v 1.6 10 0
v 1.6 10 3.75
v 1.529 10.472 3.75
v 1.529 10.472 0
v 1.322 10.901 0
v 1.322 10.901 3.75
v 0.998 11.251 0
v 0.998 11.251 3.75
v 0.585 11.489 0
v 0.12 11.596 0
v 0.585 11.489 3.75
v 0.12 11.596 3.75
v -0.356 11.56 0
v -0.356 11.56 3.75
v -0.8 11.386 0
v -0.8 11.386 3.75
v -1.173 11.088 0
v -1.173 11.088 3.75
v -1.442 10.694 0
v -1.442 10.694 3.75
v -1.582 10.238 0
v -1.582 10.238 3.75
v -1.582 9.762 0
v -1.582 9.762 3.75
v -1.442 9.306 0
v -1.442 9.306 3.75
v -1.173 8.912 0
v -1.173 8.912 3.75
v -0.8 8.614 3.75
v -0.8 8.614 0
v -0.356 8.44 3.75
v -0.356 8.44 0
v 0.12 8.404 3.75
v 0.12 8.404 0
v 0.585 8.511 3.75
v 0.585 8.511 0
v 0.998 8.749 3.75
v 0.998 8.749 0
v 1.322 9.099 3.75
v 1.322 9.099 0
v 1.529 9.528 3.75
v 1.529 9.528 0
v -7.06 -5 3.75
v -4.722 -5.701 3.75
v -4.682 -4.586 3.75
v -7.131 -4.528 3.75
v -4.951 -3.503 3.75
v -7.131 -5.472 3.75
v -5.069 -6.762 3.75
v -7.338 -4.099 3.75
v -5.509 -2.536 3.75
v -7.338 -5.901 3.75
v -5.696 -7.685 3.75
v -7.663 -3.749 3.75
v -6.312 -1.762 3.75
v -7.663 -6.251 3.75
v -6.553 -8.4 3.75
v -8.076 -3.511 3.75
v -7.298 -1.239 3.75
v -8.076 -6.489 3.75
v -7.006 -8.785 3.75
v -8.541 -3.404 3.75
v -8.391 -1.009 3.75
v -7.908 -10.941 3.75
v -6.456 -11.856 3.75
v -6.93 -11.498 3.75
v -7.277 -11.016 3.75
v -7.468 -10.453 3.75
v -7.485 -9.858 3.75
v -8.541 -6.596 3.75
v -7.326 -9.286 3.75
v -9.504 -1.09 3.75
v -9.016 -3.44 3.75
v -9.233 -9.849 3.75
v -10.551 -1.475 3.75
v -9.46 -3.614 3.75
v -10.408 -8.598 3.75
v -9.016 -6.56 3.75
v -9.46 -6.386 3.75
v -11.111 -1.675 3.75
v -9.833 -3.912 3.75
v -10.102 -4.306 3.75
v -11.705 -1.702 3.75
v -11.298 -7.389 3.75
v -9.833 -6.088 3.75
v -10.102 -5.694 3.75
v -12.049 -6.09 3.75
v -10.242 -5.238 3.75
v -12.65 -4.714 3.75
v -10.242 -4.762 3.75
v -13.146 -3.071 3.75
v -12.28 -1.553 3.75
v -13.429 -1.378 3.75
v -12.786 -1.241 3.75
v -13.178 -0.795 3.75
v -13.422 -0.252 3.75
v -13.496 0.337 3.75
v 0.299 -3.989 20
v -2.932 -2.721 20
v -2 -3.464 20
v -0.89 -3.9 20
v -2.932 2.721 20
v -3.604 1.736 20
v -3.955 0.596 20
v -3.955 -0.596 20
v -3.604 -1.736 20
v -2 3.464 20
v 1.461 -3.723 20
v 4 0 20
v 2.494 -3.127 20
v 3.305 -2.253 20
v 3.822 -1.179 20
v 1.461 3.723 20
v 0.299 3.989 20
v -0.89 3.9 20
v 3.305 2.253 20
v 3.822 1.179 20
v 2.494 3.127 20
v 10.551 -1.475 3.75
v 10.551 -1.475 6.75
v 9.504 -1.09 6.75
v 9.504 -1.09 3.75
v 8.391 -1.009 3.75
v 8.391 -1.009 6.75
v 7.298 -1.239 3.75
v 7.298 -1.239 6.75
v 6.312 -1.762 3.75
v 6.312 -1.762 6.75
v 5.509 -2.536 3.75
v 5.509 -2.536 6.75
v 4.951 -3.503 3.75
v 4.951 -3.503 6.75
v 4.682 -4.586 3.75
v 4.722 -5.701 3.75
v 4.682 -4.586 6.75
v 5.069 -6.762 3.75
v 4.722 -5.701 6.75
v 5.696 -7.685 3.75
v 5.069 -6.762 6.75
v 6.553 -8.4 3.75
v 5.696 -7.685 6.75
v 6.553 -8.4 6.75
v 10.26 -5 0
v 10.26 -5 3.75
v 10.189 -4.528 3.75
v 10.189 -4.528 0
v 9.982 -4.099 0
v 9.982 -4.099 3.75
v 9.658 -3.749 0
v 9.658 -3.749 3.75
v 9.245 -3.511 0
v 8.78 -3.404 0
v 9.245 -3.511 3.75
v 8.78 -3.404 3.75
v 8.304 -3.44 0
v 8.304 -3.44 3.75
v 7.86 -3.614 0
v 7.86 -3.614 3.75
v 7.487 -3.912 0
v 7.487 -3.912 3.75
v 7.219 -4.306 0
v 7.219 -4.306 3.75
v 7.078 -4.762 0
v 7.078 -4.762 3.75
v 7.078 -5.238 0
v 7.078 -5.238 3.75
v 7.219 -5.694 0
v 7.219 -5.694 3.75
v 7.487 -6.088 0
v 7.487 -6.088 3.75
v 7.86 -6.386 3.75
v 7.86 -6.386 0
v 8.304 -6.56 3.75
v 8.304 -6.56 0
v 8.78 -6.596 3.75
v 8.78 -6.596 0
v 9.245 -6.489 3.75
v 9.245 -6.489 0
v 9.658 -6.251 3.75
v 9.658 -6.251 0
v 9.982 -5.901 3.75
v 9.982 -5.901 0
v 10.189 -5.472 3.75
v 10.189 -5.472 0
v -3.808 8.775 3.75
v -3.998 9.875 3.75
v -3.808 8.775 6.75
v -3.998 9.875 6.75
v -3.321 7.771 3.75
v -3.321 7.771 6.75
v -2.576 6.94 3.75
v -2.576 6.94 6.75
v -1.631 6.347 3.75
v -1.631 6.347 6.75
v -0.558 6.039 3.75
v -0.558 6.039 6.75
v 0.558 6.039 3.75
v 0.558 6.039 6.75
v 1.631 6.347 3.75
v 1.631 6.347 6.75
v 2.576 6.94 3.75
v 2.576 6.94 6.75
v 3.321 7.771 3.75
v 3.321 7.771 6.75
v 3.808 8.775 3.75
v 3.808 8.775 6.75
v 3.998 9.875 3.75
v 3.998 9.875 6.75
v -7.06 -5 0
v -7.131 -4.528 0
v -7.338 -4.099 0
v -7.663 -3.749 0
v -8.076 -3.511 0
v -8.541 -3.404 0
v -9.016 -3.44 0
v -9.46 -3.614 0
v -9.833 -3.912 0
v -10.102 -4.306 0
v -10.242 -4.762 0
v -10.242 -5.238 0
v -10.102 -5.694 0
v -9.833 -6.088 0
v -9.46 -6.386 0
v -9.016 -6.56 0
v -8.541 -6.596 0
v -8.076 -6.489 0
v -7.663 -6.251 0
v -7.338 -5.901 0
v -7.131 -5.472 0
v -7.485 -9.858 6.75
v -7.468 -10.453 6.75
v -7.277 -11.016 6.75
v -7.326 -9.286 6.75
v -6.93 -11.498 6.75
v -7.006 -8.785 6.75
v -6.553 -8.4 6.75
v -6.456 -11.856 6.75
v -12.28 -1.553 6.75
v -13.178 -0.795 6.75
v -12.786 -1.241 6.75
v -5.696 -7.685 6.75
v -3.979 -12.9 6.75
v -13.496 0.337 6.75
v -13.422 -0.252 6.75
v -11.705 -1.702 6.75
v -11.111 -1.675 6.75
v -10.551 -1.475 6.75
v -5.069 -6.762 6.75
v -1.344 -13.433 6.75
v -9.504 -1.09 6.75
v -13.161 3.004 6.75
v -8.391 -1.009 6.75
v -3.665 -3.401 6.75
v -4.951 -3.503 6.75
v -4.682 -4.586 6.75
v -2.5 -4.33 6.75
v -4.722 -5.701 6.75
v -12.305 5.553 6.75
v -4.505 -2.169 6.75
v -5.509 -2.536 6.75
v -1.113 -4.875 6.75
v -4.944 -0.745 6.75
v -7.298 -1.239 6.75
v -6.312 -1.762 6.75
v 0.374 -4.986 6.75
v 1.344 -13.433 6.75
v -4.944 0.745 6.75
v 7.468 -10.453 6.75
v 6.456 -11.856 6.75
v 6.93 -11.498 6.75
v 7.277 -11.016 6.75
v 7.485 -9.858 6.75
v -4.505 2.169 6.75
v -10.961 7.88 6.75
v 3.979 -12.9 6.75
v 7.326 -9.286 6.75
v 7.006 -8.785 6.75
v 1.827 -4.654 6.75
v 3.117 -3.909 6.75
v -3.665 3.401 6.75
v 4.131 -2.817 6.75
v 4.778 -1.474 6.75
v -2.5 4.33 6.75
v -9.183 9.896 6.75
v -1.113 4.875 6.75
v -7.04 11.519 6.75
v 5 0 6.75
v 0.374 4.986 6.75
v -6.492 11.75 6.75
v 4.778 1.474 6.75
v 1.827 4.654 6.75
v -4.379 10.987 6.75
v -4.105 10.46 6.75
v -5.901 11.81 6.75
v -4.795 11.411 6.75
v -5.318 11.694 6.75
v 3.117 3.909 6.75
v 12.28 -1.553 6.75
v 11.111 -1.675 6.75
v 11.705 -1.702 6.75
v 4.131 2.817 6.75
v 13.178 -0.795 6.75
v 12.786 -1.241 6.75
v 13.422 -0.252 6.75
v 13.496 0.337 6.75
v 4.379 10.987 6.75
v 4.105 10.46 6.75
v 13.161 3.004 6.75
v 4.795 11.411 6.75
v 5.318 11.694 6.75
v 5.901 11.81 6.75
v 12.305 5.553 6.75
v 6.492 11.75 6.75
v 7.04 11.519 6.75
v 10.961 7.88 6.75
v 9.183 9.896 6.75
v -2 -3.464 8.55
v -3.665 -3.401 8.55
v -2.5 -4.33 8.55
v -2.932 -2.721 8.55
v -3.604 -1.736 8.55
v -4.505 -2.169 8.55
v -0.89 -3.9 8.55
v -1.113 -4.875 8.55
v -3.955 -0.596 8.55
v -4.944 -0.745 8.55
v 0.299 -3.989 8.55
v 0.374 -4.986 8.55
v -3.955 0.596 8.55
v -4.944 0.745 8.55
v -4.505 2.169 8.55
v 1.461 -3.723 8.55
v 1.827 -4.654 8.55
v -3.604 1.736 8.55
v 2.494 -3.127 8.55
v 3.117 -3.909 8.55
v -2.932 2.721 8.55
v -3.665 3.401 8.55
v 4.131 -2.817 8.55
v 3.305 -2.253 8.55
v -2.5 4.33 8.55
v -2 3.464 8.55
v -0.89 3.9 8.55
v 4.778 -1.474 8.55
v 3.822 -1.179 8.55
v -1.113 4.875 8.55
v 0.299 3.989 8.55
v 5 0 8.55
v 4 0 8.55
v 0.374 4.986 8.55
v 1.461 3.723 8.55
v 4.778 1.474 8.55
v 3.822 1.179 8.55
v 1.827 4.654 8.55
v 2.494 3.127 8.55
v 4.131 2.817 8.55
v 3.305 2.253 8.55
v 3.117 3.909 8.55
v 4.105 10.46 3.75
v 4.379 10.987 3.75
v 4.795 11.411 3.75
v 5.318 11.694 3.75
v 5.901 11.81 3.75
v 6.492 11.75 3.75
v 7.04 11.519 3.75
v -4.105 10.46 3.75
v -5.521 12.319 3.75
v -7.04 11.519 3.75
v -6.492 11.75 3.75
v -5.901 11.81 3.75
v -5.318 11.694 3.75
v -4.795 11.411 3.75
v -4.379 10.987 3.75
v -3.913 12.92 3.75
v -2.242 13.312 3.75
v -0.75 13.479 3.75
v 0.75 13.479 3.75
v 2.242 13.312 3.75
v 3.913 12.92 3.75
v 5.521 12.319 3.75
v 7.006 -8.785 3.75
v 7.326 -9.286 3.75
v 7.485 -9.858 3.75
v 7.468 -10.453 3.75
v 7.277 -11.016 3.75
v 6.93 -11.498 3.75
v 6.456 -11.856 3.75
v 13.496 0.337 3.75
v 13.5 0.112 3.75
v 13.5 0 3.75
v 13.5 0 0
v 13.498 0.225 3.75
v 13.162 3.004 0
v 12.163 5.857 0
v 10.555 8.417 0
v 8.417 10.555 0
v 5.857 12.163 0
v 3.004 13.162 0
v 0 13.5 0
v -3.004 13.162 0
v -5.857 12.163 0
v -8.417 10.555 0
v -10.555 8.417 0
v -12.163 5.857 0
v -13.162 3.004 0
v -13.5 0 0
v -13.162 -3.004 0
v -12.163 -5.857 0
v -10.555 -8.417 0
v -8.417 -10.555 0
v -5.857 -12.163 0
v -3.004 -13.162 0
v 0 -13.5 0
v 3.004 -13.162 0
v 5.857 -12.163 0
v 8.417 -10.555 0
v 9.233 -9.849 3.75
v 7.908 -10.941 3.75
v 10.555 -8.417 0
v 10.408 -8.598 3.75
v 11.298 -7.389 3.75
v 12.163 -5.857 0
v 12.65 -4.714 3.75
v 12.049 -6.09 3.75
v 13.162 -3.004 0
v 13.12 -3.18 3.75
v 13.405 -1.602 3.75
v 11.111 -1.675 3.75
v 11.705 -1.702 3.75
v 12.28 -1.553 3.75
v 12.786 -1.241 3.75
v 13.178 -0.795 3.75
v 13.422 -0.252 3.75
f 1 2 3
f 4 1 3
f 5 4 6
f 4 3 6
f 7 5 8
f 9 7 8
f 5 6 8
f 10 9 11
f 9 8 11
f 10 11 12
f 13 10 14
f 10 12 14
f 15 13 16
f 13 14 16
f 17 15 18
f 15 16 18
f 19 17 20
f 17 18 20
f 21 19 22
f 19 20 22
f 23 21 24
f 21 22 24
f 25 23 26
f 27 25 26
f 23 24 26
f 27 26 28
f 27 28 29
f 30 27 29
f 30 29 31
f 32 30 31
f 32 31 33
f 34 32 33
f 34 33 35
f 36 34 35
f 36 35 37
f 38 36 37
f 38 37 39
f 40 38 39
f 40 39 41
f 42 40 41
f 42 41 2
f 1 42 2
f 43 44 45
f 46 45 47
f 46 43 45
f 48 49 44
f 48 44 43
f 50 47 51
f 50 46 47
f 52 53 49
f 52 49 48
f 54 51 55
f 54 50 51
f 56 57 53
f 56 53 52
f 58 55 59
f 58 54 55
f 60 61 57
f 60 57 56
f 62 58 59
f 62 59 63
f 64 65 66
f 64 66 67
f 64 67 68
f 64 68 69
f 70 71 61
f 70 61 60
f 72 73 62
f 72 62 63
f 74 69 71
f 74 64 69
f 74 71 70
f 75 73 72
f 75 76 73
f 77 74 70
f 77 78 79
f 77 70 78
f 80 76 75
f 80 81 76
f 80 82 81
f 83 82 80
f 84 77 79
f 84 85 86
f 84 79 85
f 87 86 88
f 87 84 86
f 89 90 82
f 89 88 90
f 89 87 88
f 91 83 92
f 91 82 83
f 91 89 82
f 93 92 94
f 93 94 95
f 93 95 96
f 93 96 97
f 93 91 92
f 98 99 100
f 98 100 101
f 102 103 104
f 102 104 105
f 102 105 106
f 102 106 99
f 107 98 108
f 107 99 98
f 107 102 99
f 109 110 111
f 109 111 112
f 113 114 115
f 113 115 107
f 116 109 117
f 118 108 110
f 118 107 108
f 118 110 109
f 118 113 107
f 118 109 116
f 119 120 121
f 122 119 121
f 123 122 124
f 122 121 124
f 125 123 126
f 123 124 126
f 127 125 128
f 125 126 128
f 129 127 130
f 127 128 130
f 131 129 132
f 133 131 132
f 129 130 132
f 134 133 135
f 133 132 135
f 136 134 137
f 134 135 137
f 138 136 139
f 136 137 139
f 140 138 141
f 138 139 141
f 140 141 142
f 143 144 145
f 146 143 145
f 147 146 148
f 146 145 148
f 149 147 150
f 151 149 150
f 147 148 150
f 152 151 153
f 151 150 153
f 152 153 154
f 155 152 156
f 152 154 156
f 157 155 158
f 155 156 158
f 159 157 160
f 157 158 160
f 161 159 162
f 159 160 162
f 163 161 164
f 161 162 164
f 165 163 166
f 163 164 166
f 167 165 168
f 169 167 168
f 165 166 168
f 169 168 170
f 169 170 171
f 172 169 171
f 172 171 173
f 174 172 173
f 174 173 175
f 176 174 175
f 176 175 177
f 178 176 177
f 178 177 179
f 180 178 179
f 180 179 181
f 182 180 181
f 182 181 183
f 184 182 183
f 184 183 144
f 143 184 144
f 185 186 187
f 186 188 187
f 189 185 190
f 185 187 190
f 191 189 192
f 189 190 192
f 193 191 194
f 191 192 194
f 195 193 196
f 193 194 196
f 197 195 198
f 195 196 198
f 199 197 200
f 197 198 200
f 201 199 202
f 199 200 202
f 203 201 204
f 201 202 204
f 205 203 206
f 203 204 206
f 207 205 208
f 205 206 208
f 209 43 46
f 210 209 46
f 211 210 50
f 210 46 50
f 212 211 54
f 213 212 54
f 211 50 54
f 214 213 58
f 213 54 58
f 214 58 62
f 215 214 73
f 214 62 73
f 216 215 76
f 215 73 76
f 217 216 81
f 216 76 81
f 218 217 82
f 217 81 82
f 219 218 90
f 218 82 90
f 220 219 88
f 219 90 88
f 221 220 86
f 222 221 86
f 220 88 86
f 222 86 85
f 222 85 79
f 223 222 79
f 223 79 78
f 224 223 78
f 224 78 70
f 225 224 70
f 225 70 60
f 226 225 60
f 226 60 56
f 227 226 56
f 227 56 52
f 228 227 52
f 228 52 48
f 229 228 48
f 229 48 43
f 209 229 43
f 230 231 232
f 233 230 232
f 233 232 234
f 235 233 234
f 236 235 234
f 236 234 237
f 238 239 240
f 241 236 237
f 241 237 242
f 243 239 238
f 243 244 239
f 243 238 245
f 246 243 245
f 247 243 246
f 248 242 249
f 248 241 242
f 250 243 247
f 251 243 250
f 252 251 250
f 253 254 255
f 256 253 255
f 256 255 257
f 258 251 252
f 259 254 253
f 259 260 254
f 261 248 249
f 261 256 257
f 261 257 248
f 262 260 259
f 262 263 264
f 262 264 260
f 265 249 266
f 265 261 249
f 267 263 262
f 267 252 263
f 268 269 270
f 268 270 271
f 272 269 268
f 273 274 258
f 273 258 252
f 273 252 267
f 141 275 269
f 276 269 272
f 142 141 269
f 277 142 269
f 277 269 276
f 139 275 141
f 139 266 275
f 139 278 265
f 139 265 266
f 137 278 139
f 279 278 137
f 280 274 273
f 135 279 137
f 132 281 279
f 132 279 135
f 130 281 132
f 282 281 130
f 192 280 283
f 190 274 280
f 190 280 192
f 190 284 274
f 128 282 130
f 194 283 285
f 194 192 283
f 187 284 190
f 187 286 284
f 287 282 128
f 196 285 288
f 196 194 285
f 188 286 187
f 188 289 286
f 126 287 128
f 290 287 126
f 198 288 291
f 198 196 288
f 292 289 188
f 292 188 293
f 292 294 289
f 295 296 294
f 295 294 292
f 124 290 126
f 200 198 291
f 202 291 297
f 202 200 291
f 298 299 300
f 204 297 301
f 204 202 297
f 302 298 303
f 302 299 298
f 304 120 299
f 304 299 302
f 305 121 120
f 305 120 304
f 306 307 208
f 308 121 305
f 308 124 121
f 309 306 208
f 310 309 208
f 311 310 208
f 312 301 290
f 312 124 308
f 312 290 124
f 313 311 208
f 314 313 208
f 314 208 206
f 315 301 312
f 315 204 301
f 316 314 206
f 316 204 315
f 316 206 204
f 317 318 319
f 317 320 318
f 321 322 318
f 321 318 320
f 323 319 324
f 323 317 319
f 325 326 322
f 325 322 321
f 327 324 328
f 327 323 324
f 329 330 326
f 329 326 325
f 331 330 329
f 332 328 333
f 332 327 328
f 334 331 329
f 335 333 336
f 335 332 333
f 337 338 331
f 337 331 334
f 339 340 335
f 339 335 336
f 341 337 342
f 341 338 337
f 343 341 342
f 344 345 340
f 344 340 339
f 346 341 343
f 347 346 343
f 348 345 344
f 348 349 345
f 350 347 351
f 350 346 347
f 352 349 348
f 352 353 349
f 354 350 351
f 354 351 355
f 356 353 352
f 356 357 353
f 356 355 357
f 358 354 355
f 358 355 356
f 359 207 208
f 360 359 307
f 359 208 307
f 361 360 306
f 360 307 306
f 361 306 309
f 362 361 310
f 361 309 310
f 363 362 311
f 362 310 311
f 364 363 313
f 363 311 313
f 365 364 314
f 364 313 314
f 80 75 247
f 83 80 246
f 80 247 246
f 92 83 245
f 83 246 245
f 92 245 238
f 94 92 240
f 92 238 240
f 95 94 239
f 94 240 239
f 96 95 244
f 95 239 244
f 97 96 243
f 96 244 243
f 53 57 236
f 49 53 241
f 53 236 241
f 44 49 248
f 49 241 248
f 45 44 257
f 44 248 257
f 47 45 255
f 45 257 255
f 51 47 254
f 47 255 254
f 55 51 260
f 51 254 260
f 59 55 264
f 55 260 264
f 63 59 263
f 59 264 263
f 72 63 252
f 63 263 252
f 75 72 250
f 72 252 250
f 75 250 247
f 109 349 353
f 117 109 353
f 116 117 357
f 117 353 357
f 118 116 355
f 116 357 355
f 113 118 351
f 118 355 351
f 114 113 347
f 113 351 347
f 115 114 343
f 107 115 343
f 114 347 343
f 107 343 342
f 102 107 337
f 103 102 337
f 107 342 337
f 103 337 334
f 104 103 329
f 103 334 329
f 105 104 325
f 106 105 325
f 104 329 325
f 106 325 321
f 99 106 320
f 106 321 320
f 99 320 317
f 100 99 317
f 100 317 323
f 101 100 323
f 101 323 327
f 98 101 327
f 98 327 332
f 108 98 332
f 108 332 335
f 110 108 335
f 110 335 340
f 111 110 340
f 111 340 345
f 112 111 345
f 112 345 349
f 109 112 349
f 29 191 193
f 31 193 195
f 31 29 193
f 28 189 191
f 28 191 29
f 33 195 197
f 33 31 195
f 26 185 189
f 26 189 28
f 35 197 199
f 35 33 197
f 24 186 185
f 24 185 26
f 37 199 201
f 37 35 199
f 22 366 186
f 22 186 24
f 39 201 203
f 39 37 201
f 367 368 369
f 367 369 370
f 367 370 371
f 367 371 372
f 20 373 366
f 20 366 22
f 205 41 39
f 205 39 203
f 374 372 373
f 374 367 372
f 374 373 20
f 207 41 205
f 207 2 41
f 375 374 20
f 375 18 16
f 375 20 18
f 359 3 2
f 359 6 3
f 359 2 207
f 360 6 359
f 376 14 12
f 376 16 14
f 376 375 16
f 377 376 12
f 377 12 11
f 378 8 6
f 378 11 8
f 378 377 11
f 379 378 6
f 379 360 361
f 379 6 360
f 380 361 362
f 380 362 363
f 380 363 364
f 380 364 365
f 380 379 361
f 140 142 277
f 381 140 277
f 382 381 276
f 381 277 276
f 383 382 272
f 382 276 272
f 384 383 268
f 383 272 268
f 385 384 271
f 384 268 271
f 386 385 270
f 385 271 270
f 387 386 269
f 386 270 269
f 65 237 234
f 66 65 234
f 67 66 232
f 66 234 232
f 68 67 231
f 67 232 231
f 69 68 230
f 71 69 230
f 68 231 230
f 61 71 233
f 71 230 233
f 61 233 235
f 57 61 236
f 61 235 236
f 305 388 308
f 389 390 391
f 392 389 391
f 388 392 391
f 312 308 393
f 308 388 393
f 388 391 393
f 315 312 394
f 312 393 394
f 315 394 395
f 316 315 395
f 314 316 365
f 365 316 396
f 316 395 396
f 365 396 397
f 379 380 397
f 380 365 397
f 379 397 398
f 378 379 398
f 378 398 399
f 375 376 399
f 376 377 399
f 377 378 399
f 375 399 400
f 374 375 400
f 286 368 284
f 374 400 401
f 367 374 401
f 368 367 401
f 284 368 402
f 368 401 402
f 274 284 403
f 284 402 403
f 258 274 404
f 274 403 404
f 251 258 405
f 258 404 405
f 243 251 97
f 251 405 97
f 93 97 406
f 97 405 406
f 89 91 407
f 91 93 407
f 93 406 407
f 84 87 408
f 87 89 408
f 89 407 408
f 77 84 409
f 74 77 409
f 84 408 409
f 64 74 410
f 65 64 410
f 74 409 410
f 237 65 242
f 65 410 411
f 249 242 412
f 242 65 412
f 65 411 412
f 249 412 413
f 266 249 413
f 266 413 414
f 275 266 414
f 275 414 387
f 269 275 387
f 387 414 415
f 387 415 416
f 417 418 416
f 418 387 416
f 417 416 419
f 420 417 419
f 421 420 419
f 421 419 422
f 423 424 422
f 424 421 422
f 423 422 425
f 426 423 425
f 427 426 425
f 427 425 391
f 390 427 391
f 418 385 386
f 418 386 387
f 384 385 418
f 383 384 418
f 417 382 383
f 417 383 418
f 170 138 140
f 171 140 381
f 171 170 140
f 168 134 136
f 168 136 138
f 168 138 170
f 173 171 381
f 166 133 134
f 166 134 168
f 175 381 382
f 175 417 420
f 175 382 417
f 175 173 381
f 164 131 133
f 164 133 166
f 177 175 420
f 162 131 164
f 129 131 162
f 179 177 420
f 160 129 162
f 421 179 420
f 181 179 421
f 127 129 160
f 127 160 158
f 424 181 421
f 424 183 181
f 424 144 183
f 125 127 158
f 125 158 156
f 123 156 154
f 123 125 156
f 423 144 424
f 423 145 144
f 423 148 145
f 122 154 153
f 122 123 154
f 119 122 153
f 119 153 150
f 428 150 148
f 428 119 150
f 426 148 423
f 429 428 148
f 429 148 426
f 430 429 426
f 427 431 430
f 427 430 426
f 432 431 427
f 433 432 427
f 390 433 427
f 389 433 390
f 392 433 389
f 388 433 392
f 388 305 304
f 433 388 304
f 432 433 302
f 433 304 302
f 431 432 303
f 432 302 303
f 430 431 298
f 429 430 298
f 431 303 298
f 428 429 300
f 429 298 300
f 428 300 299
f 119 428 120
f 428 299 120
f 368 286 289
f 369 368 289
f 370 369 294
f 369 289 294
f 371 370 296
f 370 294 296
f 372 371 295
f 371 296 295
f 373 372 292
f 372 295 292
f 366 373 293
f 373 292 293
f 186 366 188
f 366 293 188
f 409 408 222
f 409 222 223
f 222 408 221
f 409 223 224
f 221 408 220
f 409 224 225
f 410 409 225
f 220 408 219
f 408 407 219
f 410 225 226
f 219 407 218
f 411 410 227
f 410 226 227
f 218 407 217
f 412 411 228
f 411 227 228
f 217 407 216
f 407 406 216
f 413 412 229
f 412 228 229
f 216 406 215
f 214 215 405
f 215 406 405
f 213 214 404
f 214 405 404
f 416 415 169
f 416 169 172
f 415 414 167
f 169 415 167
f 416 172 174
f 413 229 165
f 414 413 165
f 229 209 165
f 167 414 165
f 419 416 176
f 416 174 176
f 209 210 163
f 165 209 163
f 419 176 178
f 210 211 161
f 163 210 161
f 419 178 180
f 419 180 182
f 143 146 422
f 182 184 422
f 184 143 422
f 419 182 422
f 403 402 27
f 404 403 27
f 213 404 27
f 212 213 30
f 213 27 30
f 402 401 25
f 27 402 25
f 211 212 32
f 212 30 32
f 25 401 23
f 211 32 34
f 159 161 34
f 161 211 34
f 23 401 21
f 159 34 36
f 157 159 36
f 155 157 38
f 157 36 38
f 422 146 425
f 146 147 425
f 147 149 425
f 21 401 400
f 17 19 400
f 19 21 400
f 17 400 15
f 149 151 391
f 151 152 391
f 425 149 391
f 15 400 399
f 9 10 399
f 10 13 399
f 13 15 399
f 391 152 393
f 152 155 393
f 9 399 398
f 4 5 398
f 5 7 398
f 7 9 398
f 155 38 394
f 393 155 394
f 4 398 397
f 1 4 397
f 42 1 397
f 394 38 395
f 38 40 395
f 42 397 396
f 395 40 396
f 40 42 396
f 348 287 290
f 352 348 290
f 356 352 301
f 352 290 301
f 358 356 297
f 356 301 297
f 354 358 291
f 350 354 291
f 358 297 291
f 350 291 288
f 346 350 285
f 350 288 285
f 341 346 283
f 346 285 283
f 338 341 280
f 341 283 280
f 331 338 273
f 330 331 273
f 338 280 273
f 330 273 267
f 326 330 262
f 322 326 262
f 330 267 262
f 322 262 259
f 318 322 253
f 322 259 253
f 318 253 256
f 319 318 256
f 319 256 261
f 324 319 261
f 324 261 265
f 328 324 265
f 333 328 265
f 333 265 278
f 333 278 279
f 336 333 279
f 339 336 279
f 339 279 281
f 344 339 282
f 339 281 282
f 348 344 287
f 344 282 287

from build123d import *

# Parameters (mm, degrees)
SKETCH_1_R          = 13.5
EXTRUDE_1_DEPTH     = 20
SKETCH_2_R          = 1.6
CUT_EXTRUDE_1_DEPTH = 28.649593125
CUT_EXTRUDE_START   = -13.25
SKETCH_3_R          = 13.5
SKETCH_3_R_2        = 4
CUT_EXTRUDE_4_DEPTH = 13.25
SKETCH_4_R          = 5
SKETCH_4_R_2        = 4
EXTRUDE_2_DEPTH     = 1.8
SKETCH_5_R          = 4
SKETCH_5_R_2        = 1.6
CUT_EXTRUDE_6_DEPTH = 3
FILLET_1_R          = 2


with BuildPart() as part:
    # ｽｹｯﾁ1 → ﾎﾞｽ - 押し出し1 (new body)
    with BuildSketch(Plane.XY):
        Circle(SKETCH_1_R)
    extrude(amount=EXTRUDE_1_DEPTH)

    # ｽｹｯﾁ2 → ｶｯﾄ - 押し出し1 (cut, through all)
    with BuildSketch(Plane.XY.offset(20)):
        with Locations((0, 10)):
            Circle(SKETCH_2_R)
        with Locations((8.660254038, -5)):
            Circle(SKETCH_2_R)
        with Locations((-8.660254038, -5)):
            Circle(SKETCH_2_R)
    extrude(amount=-CUT_EXTRUDE_1_DEPTH, mode=Mode.SUBTRACT)

    # ｽｹｯﾁ3 → ｶｯﾄ - 押し出し4 (cut)
    with BuildSketch(Plane.XY.offset(20).offset(CUT_EXTRUDE_START)):
        Circle(SKETCH_3_R)
        Circle(SKETCH_3_R_2, mode=Mode.SUBTRACT)
    extrude(amount=CUT_EXTRUDE_4_DEPTH, mode=Mode.SUBTRACT)

    # ｽｹｯﾁ4 → ﾎﾞｽ - 押し出し2 (add)
    with BuildSketch(Plane.XY.offset(6.75)):
        Circle(SKETCH_4_R)
        Circle(SKETCH_4_R_2, mode=Mode.SUBTRACT)
    extrude(amount=EXTRUDE_2_DEPTH)

    # ｽｹｯﾁ5 → ｶｯﾄ - 押し出し6 (cut)
    # profile 1 of 3: a face of its own
    with BuildSketch(Plane.XY.offset(6.75)):
        with Locations((0, 10)):
            Circle(SKETCH_5_R)
        with Locations((0, 10)):
            Circle(SKETCH_5_R_2, mode=Mode.SUBTRACT)
    # profile 2 of 3: a face of its own
    with BuildSketch(Plane.XY.offset(6.75)):
        with Locations((8.660254038, -5)):
            Circle(SKETCH_5_R)
        with Locations((8.660254038, -5)):
            Circle(SKETCH_5_R_2, mode=Mode.SUBTRACT)
    # profile 3 of 3: a face of its own
    with BuildSketch(Plane.XY.offset(6.75)):
        with Locations((-8.660254038, -5)):
            Circle(SKETCH_5_R)
        with Locations((-8.660254038, -5)):
            Circle(SKETCH_5_R_2, mode=Mode.SUBTRACT)
    extrude(amount=-CUT_EXTRUDE_6_DEPTH, mode=Mode.SUBTRACT)

    # ﾌｨﾚｯﾄ1
    # the kernel refuses this fillet: 2 mm, written as the material it takes off along each edge
    with BuildSketch(Plane(origin=(-10.407876243, -8.598029548, 19.555288564), x_dir=(0.7715815777995733, -0.6361303866349423, 0), z_dir=(0, 0, -1)), Plane(origin=(12.650050133, -4.714470452, 19.555288564), x_dir=(0.1651142860452898, 0.9862744407839807, 0), z_dir=(0, 0, -1)), Plane(origin=(-2.242173889, 13.3125, 19.555288564), x_dir=(-0.9366958638448638, -0.35014405414903826, 0), z_dir=(0, 0, -1))) as fillet_1_piece_1:
        with BuildLine():
            CenterArc((4.742699468, -1.963681118), FILLET_1_R, 79.064257334, 119.641084367)
            ThreePointArc((2.848338702, -2.605083713), (1.759195342, -0.936232133), (0, 0))
            ThreePointArc((0, 0), (2.561057713, 0.245152457), (5.122115425, 0))
        make_face()
    extrude(amount=15.805288564, mode=Mode.SUBTRACT)
    with BuildSketch(Plane(origin=(-12.650050133, -4.714470452, 19.555288564), x_dir=(-0.16511428604529083, 0.9862744407839806, 0), z_dir=(0, 0, -1)), Plane(origin=(10.407876243, -8.598029548, 19.555288564), x_dir=(-0.7715815777995731, -0.6361303866349423, 0), z_dir=(0, 0, -1)), Plane(origin=(2.242173889, 13.3125, 19.555288564), x_dir=(0.9366958638448638, -0.35014405414903793, 0), z_dir=(0, 0, -1))) as fillet_1_piece_2:
        with BuildLine():
            CenterArc((4.742699468, 1.963681118), FILLET_1_R, 161.294658299, 119.641084367)
            ThreePointArc((2.848338702, 2.605083713), (1.759195342, 0.936232133), (0, 0))
            ThreePointArc((0, 0), (2.561057713, -0.245152457), (5.122115425, 0))
        make_face()
    extrude(amount=15.805288564, mode=Mode.SUBTRACT)


solid = part.part
